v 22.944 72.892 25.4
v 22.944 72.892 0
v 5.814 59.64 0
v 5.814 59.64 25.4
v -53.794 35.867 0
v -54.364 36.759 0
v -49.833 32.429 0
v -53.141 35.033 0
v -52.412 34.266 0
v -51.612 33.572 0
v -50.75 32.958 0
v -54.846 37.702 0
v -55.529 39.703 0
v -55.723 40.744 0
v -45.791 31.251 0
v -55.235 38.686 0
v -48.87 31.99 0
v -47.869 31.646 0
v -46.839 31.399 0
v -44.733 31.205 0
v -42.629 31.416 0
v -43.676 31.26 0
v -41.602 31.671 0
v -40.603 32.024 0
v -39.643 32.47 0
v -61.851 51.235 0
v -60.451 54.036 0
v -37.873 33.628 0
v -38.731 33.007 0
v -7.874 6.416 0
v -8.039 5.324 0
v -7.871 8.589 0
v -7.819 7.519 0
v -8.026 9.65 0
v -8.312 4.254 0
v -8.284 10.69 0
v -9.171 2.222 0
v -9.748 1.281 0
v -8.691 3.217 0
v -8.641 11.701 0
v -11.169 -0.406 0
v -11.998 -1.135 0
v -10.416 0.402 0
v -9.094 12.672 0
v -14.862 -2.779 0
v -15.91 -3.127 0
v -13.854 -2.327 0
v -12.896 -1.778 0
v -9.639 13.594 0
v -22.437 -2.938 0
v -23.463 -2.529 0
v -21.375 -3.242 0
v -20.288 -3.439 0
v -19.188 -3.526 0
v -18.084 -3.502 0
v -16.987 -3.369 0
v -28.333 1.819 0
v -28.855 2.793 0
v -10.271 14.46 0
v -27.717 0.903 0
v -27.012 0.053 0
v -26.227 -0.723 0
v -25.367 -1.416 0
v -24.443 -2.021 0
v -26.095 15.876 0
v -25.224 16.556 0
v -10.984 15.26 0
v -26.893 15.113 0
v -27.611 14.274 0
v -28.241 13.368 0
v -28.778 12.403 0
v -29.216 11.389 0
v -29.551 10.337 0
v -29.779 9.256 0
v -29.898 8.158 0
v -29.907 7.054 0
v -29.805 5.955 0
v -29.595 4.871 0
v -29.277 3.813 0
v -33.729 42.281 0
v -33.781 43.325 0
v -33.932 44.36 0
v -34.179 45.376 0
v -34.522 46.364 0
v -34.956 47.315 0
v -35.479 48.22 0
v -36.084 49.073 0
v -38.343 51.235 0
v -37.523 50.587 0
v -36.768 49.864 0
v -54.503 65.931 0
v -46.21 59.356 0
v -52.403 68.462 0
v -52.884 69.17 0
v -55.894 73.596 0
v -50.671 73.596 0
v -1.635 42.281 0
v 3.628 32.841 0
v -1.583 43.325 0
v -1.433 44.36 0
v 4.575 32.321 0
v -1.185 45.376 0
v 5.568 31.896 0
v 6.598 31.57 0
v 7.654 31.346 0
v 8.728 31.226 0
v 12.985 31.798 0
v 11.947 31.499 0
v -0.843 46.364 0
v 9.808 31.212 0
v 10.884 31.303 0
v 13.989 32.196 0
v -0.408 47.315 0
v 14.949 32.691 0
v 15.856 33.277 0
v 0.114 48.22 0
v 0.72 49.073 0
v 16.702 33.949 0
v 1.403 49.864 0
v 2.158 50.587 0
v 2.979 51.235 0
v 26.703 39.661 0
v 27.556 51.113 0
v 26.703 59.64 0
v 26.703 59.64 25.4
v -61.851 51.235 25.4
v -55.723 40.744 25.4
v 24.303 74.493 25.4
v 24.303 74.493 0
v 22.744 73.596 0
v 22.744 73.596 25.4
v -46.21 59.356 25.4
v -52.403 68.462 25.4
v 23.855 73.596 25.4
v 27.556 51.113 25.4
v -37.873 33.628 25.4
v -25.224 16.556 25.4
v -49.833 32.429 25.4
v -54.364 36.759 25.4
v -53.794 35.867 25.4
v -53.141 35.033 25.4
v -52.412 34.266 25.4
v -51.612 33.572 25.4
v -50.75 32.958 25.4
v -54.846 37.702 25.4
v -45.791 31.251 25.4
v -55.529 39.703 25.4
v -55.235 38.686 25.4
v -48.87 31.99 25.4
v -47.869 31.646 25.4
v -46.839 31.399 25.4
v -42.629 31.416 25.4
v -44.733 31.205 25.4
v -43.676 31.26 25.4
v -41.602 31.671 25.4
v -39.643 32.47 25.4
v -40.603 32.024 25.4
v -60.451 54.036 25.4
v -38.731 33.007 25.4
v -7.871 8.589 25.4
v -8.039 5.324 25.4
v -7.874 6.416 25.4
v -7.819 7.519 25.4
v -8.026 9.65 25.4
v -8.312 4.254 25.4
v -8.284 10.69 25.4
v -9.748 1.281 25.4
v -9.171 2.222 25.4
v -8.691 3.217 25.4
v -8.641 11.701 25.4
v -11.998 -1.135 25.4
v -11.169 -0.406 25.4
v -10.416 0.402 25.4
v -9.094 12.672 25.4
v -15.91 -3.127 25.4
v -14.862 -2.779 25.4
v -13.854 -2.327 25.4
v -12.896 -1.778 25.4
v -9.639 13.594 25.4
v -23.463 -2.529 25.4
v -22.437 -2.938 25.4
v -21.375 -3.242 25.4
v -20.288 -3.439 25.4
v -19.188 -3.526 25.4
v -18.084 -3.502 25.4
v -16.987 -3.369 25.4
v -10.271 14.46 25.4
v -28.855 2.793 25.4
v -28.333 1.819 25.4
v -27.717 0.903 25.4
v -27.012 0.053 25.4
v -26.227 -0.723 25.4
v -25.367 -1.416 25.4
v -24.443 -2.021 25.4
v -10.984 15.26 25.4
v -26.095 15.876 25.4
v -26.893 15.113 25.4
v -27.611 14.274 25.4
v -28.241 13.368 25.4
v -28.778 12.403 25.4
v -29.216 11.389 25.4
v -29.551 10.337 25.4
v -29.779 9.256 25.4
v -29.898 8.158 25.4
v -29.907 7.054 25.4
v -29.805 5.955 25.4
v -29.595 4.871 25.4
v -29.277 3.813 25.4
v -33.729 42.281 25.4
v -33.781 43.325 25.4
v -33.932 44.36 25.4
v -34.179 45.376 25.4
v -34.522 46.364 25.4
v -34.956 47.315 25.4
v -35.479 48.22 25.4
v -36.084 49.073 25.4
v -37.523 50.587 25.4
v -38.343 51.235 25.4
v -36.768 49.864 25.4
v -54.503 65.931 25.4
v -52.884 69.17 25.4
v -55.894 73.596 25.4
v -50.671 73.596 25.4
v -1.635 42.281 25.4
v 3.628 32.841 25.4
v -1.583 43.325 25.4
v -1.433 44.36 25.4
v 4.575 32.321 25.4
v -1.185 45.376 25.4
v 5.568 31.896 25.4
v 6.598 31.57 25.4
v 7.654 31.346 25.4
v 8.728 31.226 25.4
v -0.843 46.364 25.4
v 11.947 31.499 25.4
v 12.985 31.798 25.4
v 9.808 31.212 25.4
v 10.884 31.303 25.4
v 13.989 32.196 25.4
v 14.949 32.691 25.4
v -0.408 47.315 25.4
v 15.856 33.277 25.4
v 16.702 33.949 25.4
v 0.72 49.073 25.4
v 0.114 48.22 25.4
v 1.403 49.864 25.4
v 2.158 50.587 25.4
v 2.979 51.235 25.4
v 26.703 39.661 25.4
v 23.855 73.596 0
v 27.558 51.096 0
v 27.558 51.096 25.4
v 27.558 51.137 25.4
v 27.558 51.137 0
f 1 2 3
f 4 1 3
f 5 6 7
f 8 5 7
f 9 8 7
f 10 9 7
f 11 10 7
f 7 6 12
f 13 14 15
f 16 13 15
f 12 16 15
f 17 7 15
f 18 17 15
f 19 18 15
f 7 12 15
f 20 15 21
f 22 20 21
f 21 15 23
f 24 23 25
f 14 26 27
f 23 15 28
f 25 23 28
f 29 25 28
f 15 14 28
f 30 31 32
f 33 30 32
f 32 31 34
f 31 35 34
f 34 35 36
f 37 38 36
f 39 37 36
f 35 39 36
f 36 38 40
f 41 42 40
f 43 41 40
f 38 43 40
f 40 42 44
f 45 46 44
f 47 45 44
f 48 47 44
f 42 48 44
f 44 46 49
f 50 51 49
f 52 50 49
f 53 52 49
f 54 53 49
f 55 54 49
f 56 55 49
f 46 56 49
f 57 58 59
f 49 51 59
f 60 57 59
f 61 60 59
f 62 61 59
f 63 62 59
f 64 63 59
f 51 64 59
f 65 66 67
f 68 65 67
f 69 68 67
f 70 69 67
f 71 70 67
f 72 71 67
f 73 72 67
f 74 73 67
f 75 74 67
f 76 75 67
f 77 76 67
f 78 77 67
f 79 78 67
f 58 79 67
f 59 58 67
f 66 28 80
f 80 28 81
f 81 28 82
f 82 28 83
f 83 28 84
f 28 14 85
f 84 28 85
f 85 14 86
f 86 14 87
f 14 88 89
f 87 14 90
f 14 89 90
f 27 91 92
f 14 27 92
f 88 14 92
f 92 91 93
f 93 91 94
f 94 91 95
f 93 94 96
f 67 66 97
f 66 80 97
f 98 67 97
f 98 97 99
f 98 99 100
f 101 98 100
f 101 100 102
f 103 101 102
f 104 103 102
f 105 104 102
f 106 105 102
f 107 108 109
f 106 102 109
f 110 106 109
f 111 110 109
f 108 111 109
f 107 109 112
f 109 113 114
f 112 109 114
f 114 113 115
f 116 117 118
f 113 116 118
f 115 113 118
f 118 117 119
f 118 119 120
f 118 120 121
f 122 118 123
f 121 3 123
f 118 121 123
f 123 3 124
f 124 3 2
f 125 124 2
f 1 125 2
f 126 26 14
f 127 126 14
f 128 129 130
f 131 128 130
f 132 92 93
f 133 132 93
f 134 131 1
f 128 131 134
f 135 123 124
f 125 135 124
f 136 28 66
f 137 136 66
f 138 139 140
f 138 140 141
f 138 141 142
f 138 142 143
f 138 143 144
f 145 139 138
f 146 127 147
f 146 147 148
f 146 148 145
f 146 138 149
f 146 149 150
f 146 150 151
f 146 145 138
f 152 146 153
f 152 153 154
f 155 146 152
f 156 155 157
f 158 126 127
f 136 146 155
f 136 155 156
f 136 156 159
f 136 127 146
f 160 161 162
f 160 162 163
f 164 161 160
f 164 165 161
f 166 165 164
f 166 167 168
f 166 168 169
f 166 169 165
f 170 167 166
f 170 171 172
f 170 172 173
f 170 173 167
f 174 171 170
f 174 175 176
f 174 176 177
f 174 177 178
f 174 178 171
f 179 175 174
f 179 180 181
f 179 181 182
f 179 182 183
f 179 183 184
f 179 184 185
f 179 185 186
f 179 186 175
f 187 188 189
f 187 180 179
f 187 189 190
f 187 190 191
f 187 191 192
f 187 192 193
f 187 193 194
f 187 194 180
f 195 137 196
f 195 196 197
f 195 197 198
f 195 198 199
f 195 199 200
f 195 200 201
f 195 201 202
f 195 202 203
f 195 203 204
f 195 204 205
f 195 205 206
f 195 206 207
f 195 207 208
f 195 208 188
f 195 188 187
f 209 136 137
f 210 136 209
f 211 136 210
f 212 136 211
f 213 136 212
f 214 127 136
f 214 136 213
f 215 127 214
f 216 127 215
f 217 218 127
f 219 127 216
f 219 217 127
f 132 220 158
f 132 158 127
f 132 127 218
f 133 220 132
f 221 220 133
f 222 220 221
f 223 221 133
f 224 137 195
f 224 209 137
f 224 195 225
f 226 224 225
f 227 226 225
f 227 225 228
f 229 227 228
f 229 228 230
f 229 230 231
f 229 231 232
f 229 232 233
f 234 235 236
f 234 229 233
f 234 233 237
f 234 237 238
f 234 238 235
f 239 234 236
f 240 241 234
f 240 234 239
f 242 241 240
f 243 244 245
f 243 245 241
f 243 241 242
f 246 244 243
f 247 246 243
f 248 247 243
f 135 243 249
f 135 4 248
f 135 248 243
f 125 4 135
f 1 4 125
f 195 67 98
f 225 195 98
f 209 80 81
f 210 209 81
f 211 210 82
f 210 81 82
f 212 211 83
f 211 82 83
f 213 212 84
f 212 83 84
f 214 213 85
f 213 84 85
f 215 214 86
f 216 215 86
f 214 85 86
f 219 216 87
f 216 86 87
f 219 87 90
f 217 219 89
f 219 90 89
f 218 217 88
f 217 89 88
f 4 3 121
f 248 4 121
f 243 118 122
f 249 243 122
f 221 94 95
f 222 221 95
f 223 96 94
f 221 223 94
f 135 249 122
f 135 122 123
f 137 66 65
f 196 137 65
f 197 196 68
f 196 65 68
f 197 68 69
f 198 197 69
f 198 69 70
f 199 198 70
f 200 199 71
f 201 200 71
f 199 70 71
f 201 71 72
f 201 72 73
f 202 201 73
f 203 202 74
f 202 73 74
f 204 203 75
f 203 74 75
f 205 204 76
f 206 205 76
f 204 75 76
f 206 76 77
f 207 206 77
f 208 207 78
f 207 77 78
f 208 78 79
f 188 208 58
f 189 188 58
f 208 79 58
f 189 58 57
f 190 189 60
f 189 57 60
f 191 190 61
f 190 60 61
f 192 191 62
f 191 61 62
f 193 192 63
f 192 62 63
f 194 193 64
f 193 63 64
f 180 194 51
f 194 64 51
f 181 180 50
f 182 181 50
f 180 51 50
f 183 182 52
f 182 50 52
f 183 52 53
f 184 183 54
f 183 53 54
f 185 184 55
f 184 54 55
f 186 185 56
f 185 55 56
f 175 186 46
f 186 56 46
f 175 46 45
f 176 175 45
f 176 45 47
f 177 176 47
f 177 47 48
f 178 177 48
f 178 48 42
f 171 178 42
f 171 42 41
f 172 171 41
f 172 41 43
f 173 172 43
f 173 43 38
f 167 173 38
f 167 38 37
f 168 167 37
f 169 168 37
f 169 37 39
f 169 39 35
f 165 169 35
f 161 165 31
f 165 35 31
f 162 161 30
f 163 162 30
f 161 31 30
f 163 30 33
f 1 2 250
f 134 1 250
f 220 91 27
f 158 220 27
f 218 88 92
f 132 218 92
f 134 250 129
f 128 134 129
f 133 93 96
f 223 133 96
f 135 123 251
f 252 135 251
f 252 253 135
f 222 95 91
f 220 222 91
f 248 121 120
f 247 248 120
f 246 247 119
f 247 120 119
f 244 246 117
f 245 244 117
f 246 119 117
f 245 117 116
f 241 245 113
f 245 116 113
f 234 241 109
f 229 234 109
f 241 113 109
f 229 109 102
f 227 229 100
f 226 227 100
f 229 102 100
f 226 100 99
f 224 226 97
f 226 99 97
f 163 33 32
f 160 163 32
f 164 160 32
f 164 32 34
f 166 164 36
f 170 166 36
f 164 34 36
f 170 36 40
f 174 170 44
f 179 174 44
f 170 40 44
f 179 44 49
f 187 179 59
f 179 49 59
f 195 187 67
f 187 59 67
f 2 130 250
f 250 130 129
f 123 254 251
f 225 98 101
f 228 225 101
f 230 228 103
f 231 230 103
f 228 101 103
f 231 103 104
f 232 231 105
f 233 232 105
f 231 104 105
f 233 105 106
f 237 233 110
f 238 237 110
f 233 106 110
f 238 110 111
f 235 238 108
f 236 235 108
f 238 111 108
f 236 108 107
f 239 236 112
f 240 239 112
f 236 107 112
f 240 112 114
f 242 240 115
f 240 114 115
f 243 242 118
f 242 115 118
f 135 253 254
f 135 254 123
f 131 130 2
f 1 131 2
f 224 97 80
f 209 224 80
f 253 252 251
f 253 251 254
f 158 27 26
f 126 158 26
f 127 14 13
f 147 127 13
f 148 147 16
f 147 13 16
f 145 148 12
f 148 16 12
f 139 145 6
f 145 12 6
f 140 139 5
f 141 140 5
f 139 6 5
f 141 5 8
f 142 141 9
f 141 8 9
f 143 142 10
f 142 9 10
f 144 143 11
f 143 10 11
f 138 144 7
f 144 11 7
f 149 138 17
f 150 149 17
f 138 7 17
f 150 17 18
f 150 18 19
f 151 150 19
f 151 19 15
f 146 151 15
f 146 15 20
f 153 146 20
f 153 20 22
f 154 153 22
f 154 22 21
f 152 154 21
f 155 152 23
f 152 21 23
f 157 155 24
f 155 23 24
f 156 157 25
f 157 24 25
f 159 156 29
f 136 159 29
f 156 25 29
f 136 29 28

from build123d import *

# Parameters (mm, degrees)
F1_DEPTH = 25.4


with BuildPart() as f1:
    # F0 (on Top) → F1 (new body)
    with BuildSketch(Plane.XY):
        with BuildLine():
            ThreePointArc((-37.8734666786, 33.6277300409), (-34.8188839288, 37.4687345669), (-33.7290209754, 42.2537100409))
            ThreePointArc((-33.7290209754, 42.2537100409), (-33.7290294473, 42.2673925671), (-33.7290548629, 42.2810750723))
            ThreePointArc((-33.7290548629, 42.2810750723), (-34.9562672594, 47.3146936352), (-38.3431132138, 51.2354895473))
            ThreePointArc((-38.3431132138, 51.2354895473), (-50.4880897696, 51.7128598635), (-55.723366114, 40.743802495))
            ThreePointArc((-55.723366114, 40.743802495), (-48.8696733861, 31.9902417407), (-37.8734666786, 33.6277300409))
        make_face()
        with BuildLine():
            ThreePointArc((-33.7290548629, 42.2810750723), (-33.7290294473, 42.2673925671), (-33.7290209754, 42.2537100409))
            ThreePointArc((-33.7290209754, 42.2537100409), (-34.8188839288, 37.4687345669), (-37.8734666786, 33.6277300409))
            Line((-37.8734666786, 33.6277300409), (-25.2242405565, 16.5560153692))
            ThreePointArc((-25.2242405565, 16.5560153692), (-17.8663248029, 18.5222079697), (-10.9841542957, 15.2602198201))
            Line((-10.9841542957, 15.2602198201), (3.627766169, 32.8406458768))
            ThreePointArc((3.627766169, 32.8406458768), (-0.2370073884, 36.8733511802), (-1.6354740563, 42.2810750723))
            Line((-1.6354740563, 42.2810750723), (-33.7290548629, 42.2810750723))
        make_face()
        with BuildLine():
            ThreePointArc((-55.723366114, 40.743802495), (-50.4880897696, 51.7128598635), (-38.3431132138, 51.2354895473))
            Line((-38.3431132138, 51.2354895473), (-46.2101437151, 59.3555606902))
            Line((-46.2101437151, 59.3555606902), (-52.4026783197, 68.4622334303))
            Line((-52.4026783197, 68.4622334303), (-54.0672166674, 63.5277806198))
            Line((-54.0672166674, 63.5277806198), (-54.503296363, 65.9313786952))
            Line((-54.503296363, 65.9313786952), (-60.4510493577, 54.0358843751))
            Line((-60.4510493577, 54.0358843751), (-61.8512481451, 51.2354895473))
            Line((-61.8512481451, 51.2354895473), (-55.723366114, 40.743802495))
        make_face()
        with BuildLine():
            ThreePointArc((2.9785842946, 51.2354895473), (-0.4082616598, 47.3146936352), (-1.6354740563, 42.2810750723))
            ThreePointArc((-1.6354740563, 42.2810750723), (-0.2370073884, 36.8733511802), (3.627766169, 32.8406458768))
            ThreePointArc((3.627766169, 32.8406458768), (10.3472373536, 31.2442359064), (16.7018712654, 33.9494984888))
            ThreePointArc((16.7018712654, 33.9494984888), (19.4785231759, 37.6956896857), (20.4624920562, 42.2537100409))
            ThreePointArc((20.4624920562, 42.2537100409), (14.4623090039, 52.0817234938), (2.9785842946, 51.2354895473))
        make_face()
        with BuildLine():
            ThreePointArc((-10.9841542957, 15.2602198201), (-17.8663248029, 18.5222079697), (-25.2242405565, 16.5560153692))
            ThreePointArc((-25.2242405565, 16.5560153692), (-23.9590672402, -2.2873187943), (-7.8186062971, 7.5186705217))
            ThreePointArc((-7.8186062971, 7.5186705217), (-8.6405670833, 11.7005444937), (-10.9841542957, 15.2602198201))
        make_face()
        with BuildLine():
            Line((5.8138054379, 59.6403814852), (2.9785842946, 51.2354895473))
            ThreePointArc((2.9785842946, 51.2354895473), (14.4623090039, 52.0817234938), (20.4624920562, 42.2537100409))
            ThreePointArc((20.4624920562, 42.2537100409), (19.4785231759, 37.6956896857), (16.7018712654, 33.9494984888))
            Line((16.7018712654, 33.9494984888), (26.7032850534, 39.661302415))
            Line((26.7032850534, 39.661302415), (27.5560012574, 51.1132045745))
            Line((27.5560012574, 51.1132045745), (26.7032850534, 59.6403814852))
            Line((26.7032850534, 59.6403814852), (22.9439260349, 72.8916155568))
            Line((22.9439260349, 72.8916155568), (5.8138054379, 59.6403814852))
        make_face()
        Polygon((-54.0672166674, 63.5277806198), (-52.4026783197, 68.4622334303), (-52.8839736318, 69.1700209806), (-54.503296363, 65.9313786952), align=None)
        Polygon((-52.8839736318, 69.1700209806), (-52.4026783197, 68.4622334303), (-50.6707469221, 73.596470058), align=None)
        Polygon((-54.503296363, 65.9313786952), (-52.8839736318, 69.1700209806), (-55.8939576149, 73.596470058), align=None)
    extrude(amount=F1_DEPTH)


with BuildPart() as f1b:
    # F0 (on Top) → F1, piece 2 (new body)
    with BuildSketch(Plane.XY):
        Polygon((22.7439596686, 73.596470058), (22.9439260349, 72.8916155568), (23.8551047631, 73.596470058), align=None)
        Polygon((22.7439596686, 73.596470058), (23.8551047631, 73.596470058), (24.3033679332, 74.4929955189), align=None)
    extrude(amount=F1_DEPTH)


with BuildPart() as f1c:
    # F0 (on Top) → F1, piece 3 (new body)
    with BuildSketch(Plane.XY):
        Polygon((27.5577381253, 51.1365305556), (27.5560012574, 51.1132045745), (27.5577381253, 51.0958358645), align=None)
    extrude(amount=F1_DEPTH)


solid = Compound([f1.part, f1b.part, f1c.part])
